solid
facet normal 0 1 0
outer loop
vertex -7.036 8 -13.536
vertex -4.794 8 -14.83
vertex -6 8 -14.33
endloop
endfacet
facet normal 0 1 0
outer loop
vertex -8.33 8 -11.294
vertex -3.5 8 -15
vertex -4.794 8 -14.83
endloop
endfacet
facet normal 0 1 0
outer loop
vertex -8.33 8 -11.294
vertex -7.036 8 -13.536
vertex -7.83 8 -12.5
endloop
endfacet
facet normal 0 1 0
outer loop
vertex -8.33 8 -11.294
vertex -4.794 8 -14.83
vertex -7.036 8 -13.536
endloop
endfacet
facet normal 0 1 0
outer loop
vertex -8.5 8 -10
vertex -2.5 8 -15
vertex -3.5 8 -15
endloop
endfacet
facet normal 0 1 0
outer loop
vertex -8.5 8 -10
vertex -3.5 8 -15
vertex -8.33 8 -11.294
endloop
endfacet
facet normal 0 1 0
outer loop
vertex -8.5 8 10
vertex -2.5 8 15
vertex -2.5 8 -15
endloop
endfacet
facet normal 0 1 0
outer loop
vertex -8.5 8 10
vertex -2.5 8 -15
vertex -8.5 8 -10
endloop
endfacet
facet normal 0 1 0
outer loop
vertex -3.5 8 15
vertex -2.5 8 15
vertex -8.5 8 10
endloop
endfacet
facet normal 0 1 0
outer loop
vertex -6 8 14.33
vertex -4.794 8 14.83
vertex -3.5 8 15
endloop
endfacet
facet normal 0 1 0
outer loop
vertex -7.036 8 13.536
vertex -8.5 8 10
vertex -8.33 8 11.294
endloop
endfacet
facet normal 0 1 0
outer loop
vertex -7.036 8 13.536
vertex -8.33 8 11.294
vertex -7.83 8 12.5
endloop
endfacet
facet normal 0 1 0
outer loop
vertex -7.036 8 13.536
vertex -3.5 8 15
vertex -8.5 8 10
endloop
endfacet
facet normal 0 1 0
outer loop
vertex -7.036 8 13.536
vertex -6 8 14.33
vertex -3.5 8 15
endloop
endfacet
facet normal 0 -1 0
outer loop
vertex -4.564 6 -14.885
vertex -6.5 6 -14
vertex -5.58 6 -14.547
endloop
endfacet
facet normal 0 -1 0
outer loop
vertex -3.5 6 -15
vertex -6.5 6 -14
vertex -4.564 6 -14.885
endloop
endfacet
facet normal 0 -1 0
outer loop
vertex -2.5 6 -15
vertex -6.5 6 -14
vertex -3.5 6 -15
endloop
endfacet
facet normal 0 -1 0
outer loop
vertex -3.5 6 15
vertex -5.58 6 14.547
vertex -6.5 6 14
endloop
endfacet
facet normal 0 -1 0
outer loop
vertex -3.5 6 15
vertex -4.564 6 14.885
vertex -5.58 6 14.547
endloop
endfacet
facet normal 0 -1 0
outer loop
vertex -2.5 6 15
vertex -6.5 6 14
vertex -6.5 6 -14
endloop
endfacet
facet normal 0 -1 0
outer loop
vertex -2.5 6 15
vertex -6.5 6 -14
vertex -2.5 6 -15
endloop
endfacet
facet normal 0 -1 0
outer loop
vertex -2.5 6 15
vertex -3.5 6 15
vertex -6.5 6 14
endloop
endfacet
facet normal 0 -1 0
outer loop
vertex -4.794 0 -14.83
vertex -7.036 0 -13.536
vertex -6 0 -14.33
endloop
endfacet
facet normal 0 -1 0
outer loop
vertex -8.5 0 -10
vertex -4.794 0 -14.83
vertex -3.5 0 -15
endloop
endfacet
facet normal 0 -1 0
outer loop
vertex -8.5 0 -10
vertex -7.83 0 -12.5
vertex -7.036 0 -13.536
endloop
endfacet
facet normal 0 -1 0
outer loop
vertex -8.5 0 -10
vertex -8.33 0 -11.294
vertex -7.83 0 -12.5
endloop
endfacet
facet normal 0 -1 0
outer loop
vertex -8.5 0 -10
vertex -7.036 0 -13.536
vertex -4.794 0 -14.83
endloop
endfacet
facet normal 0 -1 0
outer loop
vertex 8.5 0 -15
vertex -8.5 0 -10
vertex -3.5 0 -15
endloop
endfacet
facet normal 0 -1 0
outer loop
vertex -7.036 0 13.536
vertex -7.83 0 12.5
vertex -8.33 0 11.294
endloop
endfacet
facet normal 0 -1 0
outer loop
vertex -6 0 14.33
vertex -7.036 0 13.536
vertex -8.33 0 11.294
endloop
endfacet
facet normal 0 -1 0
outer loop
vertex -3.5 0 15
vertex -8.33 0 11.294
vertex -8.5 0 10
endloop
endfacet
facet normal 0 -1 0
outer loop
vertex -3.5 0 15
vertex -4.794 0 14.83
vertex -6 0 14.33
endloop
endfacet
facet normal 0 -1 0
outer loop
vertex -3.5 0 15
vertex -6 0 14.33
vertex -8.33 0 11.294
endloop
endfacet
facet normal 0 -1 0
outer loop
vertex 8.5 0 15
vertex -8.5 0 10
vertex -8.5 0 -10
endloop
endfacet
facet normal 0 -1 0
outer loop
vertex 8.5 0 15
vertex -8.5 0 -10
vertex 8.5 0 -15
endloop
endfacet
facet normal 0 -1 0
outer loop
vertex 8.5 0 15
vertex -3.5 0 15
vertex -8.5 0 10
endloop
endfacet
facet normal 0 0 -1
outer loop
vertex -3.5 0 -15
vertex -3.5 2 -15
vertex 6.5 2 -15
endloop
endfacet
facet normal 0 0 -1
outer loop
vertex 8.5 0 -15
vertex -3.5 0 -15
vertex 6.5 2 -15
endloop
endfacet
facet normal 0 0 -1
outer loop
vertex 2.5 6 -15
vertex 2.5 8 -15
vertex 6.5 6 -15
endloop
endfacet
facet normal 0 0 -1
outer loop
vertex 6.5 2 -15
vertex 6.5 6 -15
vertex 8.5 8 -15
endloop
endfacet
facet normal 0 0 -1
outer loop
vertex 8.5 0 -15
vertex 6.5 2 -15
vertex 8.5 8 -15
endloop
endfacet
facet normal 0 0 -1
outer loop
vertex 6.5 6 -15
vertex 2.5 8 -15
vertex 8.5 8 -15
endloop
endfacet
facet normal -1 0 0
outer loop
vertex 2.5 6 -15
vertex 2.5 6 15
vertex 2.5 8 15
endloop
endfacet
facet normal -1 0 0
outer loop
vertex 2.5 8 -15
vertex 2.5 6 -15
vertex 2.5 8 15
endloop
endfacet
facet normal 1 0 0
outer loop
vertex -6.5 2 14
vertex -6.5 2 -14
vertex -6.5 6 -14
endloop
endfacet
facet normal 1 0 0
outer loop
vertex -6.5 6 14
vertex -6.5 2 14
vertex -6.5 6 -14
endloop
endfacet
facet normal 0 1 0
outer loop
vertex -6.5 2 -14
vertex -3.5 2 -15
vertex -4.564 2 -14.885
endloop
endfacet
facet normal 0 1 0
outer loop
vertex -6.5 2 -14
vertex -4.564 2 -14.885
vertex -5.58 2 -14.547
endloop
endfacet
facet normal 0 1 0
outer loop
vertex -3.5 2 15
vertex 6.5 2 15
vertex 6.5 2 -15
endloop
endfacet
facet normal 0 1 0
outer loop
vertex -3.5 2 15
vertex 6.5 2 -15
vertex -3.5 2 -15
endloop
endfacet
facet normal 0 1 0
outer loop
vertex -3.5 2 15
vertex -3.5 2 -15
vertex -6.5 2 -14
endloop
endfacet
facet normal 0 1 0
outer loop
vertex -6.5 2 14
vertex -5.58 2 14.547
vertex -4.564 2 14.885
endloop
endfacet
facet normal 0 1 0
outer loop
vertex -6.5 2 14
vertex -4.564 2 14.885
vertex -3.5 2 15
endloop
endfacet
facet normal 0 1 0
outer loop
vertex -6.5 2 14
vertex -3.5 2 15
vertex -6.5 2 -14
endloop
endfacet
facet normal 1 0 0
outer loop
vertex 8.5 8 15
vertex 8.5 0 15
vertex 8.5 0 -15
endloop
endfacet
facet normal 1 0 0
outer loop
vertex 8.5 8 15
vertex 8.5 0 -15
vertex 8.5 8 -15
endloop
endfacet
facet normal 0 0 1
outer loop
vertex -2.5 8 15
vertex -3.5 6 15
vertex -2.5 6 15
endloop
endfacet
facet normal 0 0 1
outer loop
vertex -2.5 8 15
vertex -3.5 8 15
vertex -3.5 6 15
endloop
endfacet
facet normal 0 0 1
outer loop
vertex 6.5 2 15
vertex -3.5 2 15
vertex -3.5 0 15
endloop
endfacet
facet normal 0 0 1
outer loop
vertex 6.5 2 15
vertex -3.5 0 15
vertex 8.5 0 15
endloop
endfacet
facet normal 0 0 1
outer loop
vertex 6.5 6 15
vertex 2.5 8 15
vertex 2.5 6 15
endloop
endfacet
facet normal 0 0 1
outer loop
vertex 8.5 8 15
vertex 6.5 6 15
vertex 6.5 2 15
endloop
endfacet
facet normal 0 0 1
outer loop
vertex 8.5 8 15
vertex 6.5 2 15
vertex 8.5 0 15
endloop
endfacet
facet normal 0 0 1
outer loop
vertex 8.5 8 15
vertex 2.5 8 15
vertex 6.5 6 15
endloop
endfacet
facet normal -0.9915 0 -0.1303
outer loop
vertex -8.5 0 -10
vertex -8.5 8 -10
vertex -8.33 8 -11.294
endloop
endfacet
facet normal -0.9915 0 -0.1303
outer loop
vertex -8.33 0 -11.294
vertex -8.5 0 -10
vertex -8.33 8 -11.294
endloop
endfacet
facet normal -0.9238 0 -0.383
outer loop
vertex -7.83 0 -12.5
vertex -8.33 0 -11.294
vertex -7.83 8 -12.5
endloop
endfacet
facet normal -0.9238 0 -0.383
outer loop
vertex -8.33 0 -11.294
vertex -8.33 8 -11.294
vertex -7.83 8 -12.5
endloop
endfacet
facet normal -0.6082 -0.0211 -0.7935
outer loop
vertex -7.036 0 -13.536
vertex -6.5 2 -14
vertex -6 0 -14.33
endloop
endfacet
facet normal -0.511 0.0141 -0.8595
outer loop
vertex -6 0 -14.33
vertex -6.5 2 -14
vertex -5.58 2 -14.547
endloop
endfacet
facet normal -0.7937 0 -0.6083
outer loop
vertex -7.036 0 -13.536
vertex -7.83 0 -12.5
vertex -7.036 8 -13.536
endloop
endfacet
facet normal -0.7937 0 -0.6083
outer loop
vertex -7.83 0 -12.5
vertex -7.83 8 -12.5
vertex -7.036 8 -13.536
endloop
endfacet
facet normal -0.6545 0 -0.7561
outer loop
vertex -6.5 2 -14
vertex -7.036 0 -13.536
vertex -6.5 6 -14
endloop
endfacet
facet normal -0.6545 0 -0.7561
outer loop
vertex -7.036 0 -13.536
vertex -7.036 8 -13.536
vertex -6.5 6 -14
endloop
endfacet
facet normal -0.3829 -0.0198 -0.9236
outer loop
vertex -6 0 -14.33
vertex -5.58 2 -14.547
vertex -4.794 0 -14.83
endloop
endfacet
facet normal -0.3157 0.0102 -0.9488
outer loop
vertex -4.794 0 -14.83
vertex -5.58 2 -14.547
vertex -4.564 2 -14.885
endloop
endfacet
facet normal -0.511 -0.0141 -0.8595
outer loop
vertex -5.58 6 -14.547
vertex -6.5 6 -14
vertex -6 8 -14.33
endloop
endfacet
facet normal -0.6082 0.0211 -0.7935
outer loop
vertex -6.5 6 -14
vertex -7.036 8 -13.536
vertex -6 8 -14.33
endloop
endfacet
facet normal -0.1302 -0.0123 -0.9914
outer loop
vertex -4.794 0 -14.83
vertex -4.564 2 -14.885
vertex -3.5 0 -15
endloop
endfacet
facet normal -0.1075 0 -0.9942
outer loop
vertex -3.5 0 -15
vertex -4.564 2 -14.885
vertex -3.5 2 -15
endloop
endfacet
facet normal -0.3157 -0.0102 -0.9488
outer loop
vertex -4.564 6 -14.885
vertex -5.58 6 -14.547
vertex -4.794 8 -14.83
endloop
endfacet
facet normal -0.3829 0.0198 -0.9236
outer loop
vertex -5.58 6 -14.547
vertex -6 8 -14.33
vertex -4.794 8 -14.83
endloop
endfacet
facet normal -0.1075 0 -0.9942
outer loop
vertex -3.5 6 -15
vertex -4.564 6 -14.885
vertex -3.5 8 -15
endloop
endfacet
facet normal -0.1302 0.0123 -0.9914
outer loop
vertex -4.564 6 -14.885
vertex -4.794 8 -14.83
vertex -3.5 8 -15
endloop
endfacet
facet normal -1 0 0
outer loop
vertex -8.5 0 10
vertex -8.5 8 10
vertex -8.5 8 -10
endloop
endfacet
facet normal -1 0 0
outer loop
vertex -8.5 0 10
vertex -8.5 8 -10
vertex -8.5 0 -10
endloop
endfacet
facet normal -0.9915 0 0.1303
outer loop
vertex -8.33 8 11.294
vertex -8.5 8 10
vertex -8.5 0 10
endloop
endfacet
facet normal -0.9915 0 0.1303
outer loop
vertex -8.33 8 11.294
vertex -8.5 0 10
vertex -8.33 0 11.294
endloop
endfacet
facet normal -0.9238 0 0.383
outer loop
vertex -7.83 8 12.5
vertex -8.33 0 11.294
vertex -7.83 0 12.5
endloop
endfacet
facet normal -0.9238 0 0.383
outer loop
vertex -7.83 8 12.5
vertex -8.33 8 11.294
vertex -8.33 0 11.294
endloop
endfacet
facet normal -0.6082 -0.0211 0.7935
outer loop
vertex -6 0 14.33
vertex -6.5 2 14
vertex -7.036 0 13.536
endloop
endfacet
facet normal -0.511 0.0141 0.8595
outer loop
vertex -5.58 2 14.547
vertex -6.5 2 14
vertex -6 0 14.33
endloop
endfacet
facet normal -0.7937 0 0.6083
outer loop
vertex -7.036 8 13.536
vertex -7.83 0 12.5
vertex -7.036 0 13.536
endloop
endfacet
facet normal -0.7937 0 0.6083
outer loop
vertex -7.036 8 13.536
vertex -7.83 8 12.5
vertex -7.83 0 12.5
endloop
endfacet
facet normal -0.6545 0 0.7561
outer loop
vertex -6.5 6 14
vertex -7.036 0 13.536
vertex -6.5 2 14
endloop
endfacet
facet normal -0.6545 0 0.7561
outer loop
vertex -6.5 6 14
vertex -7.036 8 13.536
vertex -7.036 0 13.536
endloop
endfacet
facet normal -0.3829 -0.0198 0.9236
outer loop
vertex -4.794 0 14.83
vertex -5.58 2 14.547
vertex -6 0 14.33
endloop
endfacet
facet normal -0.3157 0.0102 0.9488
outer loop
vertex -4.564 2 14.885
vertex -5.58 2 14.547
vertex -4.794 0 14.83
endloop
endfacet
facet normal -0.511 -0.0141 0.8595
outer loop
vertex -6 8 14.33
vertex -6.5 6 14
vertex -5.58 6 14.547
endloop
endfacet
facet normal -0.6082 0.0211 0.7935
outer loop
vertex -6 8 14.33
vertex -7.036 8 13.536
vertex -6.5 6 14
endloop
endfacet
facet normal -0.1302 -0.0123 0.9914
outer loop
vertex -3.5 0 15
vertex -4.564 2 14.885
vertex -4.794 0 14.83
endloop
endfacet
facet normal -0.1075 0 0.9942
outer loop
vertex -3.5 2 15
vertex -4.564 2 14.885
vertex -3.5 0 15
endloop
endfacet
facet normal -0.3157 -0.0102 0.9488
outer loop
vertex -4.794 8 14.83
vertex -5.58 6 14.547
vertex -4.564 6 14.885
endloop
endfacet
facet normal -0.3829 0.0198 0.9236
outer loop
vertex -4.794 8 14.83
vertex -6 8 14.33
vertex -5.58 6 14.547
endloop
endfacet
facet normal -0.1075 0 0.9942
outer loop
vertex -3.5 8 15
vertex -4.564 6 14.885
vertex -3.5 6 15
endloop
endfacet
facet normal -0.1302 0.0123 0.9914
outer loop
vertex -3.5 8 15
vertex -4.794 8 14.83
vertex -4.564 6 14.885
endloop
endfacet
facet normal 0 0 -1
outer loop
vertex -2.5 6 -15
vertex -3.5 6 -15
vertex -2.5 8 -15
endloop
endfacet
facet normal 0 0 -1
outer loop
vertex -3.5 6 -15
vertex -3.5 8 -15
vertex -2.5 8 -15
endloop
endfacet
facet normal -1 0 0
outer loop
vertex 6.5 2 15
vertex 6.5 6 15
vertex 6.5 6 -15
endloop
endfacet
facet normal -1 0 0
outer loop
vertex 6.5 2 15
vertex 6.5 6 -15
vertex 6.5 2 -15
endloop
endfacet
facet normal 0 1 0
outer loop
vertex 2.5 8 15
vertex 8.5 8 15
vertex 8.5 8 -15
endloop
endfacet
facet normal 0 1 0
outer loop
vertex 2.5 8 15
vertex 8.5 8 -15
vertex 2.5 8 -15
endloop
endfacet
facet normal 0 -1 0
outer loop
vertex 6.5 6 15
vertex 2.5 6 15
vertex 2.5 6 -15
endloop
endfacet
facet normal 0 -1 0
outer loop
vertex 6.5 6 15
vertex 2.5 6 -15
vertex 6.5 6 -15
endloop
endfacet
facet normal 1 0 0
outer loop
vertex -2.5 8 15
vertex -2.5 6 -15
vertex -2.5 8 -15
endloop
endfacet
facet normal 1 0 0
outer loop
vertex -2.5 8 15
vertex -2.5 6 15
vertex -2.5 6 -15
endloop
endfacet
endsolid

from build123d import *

# Parameters (mm, degrees)
F0_W        = 4
F0_H        = 2
F0_W_2      = 2
F0_H_2      = 4
F0_W_3      = 6.5
F1_DEPTH    = 15
F2_T1_DEPTH = 33


# Not quite as in the source:
# - a fillet or chamfer that OpenCascade refuses, or shapes differently, is made with other operations: its cross-section is extruded or revolved along the edge and cut away or added


with BuildPart() as f1:
    # F0 (on Top) → F1 (new body, symmetric)
    with BuildSketch(Plane.XY):
        with Locations((-4.5, 7)):
            Rectangle(F0_W, F0_H)
        with Locations((-7.5, 7)):
            Rectangle(F0_W_2, F0_H)
        with Locations((-7.5, 4)):
            Rectangle(F0_W_2, F0_H_2)
        with Locations((-7.5, 1)):
            Rectangle(F0_W_2, F0_H)
        with Locations((-3.25, 1)):
            Rectangle(F0_W_3, F0_H)
        with Locations((3.25, 1)):
            Rectangle(F0_W_3, F0_H)
        with Locations((7.5, 1)):
            Rectangle(F0_W_2, F0_H)
        with Locations((7.5, 4)):
            Rectangle(F0_W_2, F0_H_2)
        with Locations((7.5, 7)):
            Rectangle(F0_W_2, F0_H)
        with Locations((4.5, 7)):
            Rectangle(F0_W, F0_H)
    extrude(amount=F1_DEPTH, both=True)

    # F2: fillet of radius 5 on 2 edges, made by hand

    # F2_s2 → F2_t1 (cut)
    with BuildSketch(Plane.XZ.offset(-20.5)):
        with BuildLine():
            ThreePointArc((-8.5, -10), (-7.0355339059, -13.5355339059), (-3.5, -15))
            Line((-3.5, -15), (-8.5, -15))
            Line((-8.5, -15), (-8.5, -10))
        make_face()
        with BuildLine():
            ThreePointArc((-8.5, 10), (-7.0355339059, 13.5355339059), (-3.5, 15))
            Line((-3.5, 15), (-8.5, 15))
            Line((-8.5, 15), (-8.5, 10))
        make_face()
    extrude(amount=F2_T1_DEPTH, mode=Mode.SUBTRACT)


solid = f1.part
